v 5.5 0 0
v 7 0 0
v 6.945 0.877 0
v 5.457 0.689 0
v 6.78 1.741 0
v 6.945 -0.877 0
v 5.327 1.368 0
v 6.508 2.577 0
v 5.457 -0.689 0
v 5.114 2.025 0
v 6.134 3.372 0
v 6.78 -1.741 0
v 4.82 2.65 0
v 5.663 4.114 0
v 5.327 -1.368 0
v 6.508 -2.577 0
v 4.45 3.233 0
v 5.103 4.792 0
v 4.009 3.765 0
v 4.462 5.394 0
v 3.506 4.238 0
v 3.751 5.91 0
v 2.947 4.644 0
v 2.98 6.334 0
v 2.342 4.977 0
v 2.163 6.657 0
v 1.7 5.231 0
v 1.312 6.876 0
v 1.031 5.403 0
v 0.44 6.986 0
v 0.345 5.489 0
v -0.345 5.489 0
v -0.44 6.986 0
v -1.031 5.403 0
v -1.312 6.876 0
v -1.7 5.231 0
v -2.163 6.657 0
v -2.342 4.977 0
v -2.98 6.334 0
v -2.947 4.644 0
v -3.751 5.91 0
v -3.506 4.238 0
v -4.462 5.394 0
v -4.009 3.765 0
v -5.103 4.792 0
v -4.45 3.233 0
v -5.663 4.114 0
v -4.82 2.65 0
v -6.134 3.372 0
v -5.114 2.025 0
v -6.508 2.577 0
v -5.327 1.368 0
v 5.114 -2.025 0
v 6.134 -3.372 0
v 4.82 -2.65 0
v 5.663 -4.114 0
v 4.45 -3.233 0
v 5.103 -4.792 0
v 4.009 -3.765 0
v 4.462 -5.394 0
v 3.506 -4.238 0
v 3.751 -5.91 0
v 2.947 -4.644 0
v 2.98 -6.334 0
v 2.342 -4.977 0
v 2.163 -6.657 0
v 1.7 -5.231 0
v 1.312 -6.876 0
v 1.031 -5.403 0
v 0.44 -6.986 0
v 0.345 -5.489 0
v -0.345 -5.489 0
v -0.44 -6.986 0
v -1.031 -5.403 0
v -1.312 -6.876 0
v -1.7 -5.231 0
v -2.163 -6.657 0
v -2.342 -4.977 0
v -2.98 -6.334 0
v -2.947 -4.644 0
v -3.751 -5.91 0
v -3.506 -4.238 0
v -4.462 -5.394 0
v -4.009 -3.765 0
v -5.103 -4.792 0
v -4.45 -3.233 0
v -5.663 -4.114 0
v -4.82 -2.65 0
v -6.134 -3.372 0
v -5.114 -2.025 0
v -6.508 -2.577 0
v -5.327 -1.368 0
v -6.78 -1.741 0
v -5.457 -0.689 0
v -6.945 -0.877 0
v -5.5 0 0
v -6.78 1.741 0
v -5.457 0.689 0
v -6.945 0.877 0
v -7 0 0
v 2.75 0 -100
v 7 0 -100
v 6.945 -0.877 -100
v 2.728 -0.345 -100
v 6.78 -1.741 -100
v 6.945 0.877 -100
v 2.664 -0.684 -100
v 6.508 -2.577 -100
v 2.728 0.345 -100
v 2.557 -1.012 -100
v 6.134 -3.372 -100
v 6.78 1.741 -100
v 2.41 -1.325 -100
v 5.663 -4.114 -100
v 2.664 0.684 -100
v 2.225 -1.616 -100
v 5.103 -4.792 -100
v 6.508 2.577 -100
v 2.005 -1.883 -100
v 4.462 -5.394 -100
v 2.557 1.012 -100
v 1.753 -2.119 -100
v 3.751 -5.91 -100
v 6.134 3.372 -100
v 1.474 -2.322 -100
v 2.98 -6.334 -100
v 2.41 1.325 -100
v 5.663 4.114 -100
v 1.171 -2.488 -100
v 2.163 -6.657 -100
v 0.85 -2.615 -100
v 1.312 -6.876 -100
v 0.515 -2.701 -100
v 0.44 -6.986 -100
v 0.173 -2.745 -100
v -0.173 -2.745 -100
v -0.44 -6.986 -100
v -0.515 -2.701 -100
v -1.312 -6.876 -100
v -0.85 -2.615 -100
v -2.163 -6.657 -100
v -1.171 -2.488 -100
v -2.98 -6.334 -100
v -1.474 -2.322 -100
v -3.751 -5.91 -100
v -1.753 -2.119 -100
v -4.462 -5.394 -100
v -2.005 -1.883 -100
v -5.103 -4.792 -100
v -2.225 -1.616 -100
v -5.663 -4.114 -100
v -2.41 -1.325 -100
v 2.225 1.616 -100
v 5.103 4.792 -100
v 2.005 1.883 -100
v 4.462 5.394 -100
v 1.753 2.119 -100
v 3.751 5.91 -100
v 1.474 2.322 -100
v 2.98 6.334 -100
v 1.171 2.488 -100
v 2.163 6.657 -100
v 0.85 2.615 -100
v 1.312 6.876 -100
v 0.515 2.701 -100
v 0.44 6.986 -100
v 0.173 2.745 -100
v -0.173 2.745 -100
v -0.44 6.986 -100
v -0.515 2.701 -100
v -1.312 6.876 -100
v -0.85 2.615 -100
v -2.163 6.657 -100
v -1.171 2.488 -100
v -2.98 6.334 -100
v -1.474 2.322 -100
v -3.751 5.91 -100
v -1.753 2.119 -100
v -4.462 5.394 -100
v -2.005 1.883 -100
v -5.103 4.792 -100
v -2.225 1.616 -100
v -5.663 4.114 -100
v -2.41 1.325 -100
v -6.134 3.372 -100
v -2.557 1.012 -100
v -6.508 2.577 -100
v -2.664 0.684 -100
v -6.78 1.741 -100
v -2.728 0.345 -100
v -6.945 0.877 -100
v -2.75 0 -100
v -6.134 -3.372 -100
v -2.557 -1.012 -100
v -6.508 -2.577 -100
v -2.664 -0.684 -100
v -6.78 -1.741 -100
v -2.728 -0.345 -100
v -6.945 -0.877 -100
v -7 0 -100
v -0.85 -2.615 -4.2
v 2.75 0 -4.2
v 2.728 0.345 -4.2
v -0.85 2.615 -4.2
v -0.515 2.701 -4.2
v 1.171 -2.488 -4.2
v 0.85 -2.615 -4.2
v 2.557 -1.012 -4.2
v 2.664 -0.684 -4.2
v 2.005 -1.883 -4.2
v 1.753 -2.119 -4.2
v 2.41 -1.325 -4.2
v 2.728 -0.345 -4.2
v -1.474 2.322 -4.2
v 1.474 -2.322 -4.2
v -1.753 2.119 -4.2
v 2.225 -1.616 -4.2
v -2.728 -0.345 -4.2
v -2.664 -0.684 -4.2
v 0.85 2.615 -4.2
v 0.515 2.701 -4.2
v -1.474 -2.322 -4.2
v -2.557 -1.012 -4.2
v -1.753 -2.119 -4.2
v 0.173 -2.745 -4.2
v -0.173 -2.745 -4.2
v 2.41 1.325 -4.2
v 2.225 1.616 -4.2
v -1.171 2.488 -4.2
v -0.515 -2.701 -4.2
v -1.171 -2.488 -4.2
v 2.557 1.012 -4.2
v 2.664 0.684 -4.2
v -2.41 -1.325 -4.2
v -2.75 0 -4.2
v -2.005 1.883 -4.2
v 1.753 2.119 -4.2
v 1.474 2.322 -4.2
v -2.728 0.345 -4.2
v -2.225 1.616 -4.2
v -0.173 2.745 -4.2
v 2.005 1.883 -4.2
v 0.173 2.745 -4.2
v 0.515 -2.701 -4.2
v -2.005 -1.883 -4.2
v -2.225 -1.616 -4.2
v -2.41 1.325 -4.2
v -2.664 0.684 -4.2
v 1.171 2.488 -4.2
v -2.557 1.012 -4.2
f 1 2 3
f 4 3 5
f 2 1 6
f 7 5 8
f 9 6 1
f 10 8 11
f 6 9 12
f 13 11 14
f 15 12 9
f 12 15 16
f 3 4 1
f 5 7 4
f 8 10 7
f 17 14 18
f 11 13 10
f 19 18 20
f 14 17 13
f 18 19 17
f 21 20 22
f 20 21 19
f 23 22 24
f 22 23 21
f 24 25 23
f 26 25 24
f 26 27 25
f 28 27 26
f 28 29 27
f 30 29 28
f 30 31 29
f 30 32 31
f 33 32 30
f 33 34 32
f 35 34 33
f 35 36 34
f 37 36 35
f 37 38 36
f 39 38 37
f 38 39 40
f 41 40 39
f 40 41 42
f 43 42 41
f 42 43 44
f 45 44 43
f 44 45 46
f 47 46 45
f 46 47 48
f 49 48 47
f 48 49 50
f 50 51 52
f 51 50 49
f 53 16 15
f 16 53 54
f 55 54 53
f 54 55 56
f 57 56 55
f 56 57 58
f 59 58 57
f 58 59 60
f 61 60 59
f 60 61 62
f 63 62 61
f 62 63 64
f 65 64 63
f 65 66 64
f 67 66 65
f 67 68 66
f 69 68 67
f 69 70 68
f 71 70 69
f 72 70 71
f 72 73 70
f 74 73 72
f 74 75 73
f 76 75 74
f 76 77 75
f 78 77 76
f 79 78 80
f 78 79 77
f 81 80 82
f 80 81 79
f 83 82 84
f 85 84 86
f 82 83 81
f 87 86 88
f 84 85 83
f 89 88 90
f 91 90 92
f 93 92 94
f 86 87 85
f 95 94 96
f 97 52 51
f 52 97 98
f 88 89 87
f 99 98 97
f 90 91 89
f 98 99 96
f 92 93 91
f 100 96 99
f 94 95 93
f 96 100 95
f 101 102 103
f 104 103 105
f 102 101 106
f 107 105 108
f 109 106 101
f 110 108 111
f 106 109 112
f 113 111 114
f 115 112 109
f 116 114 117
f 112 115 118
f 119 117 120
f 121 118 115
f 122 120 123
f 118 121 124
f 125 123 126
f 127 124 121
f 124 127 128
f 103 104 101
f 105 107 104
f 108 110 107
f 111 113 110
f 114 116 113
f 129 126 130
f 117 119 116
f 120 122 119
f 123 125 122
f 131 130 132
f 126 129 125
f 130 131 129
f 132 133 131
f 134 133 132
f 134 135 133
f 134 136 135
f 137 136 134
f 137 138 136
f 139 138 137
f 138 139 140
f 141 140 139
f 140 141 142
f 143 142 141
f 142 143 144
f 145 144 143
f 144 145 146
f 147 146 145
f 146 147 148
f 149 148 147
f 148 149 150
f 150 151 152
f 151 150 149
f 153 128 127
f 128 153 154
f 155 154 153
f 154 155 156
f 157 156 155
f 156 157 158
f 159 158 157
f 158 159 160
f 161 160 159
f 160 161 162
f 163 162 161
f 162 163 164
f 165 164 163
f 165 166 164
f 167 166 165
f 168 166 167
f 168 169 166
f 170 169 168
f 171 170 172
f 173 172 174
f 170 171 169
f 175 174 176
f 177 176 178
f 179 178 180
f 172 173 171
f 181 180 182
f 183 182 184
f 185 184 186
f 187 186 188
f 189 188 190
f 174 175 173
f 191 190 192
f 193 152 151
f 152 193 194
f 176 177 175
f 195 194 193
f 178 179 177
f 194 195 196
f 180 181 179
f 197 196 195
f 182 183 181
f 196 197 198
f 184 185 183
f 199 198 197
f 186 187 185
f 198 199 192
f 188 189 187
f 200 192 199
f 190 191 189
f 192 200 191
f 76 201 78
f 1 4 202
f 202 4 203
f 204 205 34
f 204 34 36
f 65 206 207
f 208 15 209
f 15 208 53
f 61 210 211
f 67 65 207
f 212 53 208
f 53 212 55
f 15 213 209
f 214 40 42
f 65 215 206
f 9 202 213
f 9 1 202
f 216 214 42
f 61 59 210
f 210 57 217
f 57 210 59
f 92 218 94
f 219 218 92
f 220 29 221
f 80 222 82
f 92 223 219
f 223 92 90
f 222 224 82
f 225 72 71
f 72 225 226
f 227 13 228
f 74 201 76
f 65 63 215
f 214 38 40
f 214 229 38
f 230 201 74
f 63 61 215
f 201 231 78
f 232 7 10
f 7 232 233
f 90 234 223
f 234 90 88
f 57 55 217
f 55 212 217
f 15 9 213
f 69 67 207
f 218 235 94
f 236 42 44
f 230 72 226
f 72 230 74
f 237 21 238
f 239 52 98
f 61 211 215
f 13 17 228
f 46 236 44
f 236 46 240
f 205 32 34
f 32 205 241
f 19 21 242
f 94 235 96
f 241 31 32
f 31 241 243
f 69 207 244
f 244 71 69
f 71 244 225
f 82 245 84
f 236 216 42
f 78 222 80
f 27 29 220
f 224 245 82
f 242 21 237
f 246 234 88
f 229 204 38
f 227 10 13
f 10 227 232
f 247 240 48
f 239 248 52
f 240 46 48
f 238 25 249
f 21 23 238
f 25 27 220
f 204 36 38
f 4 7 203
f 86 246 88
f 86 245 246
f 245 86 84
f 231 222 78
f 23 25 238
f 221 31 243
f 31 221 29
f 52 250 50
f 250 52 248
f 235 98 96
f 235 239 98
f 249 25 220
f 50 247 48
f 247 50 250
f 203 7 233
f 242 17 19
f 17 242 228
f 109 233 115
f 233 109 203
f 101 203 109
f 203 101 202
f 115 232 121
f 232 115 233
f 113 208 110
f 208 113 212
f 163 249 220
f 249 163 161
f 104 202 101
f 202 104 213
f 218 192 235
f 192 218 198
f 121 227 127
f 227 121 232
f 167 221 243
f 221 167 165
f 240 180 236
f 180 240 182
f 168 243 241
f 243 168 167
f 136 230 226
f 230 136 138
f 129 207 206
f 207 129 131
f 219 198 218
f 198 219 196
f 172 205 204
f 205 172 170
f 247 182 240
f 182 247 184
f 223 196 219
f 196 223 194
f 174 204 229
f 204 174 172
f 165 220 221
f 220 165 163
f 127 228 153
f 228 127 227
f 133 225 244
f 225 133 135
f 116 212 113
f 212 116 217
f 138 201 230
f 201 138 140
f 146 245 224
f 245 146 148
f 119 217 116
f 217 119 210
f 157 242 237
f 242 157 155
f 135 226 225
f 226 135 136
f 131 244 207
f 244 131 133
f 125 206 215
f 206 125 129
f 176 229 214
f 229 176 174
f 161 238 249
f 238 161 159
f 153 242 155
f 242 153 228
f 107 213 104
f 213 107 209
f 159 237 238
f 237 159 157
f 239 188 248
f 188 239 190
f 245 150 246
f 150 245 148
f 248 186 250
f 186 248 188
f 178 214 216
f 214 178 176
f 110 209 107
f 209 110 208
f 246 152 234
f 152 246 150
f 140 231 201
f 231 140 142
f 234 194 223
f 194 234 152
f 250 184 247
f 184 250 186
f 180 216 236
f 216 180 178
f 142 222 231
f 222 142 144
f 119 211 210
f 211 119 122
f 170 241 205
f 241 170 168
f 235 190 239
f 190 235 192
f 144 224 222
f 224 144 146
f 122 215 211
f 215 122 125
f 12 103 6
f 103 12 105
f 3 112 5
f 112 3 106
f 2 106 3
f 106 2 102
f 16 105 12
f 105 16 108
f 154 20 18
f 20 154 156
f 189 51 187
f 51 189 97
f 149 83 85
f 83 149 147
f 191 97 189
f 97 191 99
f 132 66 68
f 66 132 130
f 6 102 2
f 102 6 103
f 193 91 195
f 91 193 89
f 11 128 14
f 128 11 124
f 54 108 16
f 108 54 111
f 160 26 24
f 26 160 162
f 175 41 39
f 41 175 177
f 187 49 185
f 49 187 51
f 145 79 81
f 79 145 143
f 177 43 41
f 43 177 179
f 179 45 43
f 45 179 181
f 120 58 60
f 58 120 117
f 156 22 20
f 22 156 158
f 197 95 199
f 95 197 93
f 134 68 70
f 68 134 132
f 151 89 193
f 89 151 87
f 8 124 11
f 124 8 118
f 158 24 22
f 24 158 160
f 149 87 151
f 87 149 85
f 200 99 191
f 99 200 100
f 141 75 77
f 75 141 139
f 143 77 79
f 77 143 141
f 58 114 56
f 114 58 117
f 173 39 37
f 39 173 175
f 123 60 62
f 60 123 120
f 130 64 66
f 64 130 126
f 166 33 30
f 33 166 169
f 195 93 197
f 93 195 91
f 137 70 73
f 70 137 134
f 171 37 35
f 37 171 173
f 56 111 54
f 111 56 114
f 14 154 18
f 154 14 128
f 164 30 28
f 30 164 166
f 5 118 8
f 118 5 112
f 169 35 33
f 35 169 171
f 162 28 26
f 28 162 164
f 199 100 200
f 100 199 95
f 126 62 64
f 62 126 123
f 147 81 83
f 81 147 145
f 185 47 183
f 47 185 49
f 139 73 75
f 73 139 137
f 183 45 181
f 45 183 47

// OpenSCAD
$fn = 50;


difference() {
	union() {
		translate(v = [0, 0, -100.0000000000]) {
			cylinder(h = 100, r = 7.0000000000);
		}
		cylinder(h = 0, r = 16.0000000000);
	}
	union() {
		translate(v = [0, 0, 0]) {
			rotate(a = [0, 0, 0]) {
				difference() {
					union() {
						#translate(v = [0, 0, -100.0000000000]) {
							cylinder(h = 100, r = 2.2500000000);
						}
						#translate(v = [0, 0, -4.2000000000]) {
							cylinder(h = 4.2000000000, r = 7.0000000000, r1 = 2.7500000000, r2 = 5.5000000000);
						}
						#translate(v = [0, 0, -100.0000000000]) {
							cylinder(h = 100, r = 2.7500000000);
						}
						#translate(v = [0, 0, -100.0000000000]) {
							cylinder(h = 100, r = 2.2500000000);
						}
					}
					union();
				}
			}
		}
	}
}
